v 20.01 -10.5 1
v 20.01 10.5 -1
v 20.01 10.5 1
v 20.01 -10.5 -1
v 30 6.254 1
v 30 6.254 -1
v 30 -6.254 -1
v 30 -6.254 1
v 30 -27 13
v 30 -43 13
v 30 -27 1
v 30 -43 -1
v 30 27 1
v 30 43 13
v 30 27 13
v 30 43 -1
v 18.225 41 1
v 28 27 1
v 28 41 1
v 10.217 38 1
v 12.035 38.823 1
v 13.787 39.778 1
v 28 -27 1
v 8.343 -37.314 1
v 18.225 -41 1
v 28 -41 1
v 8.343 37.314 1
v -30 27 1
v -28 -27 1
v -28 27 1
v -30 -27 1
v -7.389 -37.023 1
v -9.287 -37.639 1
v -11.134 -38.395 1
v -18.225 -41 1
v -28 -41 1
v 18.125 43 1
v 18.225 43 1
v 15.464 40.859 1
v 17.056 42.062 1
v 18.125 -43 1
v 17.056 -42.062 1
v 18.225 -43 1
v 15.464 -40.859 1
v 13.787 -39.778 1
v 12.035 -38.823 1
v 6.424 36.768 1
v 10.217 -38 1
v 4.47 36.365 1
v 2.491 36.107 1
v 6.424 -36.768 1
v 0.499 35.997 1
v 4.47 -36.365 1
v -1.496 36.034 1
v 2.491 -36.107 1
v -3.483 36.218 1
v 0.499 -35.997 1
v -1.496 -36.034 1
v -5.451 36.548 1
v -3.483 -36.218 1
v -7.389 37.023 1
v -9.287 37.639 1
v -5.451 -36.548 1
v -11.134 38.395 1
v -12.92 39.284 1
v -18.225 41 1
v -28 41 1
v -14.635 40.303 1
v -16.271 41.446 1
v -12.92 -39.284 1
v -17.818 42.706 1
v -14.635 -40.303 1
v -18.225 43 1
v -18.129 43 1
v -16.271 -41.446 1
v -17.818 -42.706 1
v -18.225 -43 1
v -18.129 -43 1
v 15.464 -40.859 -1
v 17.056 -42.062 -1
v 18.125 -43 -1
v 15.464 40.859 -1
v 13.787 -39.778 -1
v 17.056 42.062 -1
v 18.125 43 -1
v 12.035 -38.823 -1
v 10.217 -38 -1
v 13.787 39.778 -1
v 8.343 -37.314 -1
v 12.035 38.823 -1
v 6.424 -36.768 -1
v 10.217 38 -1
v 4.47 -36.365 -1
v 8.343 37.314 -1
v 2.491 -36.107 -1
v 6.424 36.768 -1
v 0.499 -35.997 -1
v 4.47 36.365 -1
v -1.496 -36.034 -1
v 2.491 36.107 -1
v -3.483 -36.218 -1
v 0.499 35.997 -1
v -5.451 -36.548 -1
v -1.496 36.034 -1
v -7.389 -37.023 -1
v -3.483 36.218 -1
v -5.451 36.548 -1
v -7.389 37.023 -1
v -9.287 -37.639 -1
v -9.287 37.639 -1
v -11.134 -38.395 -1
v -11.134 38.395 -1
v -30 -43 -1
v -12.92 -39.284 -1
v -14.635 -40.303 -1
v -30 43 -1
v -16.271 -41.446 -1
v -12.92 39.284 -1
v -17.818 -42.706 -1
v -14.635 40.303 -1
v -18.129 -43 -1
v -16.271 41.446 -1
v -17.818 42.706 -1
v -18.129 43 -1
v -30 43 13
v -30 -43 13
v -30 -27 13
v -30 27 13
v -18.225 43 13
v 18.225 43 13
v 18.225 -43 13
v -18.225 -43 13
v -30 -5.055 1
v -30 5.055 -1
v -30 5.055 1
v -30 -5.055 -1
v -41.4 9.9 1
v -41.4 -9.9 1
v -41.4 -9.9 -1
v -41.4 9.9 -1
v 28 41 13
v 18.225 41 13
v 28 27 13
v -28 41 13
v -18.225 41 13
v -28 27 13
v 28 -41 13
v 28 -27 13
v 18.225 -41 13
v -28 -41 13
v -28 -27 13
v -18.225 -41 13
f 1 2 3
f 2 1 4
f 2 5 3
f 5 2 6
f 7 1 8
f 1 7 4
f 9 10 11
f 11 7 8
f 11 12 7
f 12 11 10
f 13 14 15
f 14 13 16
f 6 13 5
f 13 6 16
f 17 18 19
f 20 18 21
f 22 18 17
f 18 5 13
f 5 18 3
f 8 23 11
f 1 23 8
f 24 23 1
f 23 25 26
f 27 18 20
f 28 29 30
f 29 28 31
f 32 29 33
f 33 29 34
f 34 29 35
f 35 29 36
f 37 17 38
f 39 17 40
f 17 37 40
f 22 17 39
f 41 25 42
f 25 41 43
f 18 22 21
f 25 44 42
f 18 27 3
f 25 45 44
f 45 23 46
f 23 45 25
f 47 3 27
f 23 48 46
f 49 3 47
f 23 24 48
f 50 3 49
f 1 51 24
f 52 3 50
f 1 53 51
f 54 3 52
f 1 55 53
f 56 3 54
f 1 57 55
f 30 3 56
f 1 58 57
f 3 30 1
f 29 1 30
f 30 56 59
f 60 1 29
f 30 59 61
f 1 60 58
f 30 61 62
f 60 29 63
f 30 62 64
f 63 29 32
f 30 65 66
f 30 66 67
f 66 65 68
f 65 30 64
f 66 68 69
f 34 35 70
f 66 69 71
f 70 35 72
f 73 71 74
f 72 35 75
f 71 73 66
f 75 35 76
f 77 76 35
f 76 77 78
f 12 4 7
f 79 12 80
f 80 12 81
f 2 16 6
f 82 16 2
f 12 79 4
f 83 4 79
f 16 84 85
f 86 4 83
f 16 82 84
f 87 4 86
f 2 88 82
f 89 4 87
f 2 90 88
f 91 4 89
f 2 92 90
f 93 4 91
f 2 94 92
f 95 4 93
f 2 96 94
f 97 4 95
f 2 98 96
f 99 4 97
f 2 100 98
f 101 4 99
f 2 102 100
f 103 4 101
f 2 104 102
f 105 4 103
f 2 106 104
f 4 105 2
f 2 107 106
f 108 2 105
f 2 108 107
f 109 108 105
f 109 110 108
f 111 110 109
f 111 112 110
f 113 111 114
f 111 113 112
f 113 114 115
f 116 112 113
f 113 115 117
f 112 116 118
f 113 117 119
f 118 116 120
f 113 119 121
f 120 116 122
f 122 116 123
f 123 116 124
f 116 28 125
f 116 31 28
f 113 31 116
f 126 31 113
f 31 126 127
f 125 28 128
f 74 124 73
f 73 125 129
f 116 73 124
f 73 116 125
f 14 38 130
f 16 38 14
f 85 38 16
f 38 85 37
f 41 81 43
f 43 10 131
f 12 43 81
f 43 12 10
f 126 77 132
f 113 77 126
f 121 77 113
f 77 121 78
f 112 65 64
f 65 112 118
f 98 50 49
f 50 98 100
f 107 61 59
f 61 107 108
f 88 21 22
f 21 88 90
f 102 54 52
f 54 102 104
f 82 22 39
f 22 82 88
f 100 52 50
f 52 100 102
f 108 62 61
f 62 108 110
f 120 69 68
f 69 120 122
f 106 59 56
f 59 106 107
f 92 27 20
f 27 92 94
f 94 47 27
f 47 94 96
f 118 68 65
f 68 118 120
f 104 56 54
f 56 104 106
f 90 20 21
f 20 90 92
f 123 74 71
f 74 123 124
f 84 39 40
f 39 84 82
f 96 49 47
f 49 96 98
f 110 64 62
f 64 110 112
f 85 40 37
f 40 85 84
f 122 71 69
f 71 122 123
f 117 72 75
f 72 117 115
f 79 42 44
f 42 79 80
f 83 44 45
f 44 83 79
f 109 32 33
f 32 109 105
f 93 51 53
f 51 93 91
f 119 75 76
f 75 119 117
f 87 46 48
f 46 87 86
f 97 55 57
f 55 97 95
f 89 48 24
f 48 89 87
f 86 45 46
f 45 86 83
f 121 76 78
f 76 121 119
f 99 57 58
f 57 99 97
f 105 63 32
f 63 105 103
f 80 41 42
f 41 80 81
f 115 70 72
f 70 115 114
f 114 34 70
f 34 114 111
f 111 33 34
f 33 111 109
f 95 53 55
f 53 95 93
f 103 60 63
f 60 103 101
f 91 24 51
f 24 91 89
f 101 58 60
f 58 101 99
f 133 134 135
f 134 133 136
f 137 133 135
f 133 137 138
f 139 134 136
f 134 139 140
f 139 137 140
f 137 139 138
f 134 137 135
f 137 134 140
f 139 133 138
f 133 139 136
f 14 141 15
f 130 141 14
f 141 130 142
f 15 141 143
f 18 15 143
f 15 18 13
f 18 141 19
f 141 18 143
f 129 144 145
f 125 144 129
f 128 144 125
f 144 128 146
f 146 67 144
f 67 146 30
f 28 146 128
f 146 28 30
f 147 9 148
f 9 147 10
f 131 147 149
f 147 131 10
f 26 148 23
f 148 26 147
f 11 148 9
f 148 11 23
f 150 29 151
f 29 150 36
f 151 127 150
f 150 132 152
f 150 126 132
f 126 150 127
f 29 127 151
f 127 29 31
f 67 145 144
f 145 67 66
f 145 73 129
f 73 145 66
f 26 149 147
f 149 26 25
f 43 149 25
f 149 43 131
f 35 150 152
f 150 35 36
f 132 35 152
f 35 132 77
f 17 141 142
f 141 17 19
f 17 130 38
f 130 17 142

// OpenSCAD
// [FL_INDEX: keywords="openscad, 3d_parametric, Game_card_holder, csg_solid" | COT="Parametric OpenSCAD design from 3DCodeverse"]
// Title: Game card holder

//Settlers game card holder
// 1 to 1 copy of previous blender version but with parameters for changeing dimention

//Constants
card_x = 54; //original 54
card_y = 80; //original 80
card_space = 2; //original 2
wall_thickness = 2; //original 2
plate_height = 2; //original 2
wall_height = 12; //original 12
shortwall_cut = card_x/(card_y/card_x);
shortwall = (card_x-shortwall_cut)/2+wall_thickness+card_space/2;

//Connecting piece
//the "female" part is 21mm at the biggest point and 12.5mm at the smallest and 10mm deep
//the "male" part is  19.8mm at the biggest point and 10.46mm at smallest and 11.4mm long
//the odd numbers are because i used a manualy freehand modifed box with no real grid snapping, and some random scaling
female_con_x = 10;
female_con_y1 = 21;
female_con_y2 = 12.5;
male_con_x = 11.4;
male_con_y1 = 19.8;
male_con_y2 = 10.46;
angle = atan( ((female_con_y1-female_con_y2)/2) / female_con_x ); // same for both


union() {

	difference() {
		//Base plate
		cube(size = [card_x+card_space+wall_thickness*2, card_y+card_space+wall_thickness*2,plate_height], center = true);
		//Round Cut
		// was made with a cylinder with radius=32 scaled in x and y by 0.8, resulting in R=25.6 and that is aprox card_x
		translate([0,card_y/1.27,-card_x/4])
		cylinder(card_x/2, card_x/2, card_x/2, $fa=2);
		translate([0,-card_y/1.27,-card_x/4])
		cylinder(card_x/2, card_x/2, card_x/2, $fa=2);
		
		//female con
		translate( [ (card_x/2) - female_con_x + card_space/2 + wall_thickness +0.01 , -female_con_y1/2, -plate_height ] ) //0.01 is for overlapping
		difference() {
			cube(size = [female_con_x, female_con_y1, plate_height*2], center = false);
			translate( [ 0,female_con_y1,-1 ] )
			rotate([0, 0, -angle])
			cube(female_con_x*2);
			translate( [ 0,0,-1 ] )
			rotate([0, 0, angle-90])
			cube(female_con_x*2);
		}

	}

	//male con
	translate( [ -(card_x/2) - card_space/2 - wall_thickness - male_con_x, -male_con_y1/2, -plate_height/2 ] ) 
	difference() {
		cube(size = [male_con_x, male_con_y1, plate_height], center = false);
		translate( [ 0,male_con_y1,-1 ] )
		rotate([0, 0, -angle])
		cube(male_con_x*2);
		translate( [ 0,0,-1 ] )
		rotate([0, 0, angle-90])
		cube(male_con_x*2);
	}

	//Cards for reference
	//%cube(size = [card_x,card_y,9], center = true);
	//%cube(size = [card_y,card_x,9], center = true);
	
	//%cube(size= [shortwall_cut, 100,20], center = true);
	
	// Long wall 1 of 4
	translate([  (card_x+card_space+wall_thickness*2)/2 , (card_y+card_space+wall_thickness*2)/2 ,plate_height/2])
	rotate([0,0,180])
	cube(size = [wall_thickness,(card_y-card_x)/2+wall_thickness+card_space/2,wall_height] ,center = false);
	
	// Long wall 2 of 4
	translate([  -(card_x+card_space+wall_thickness*2)/2 +wall_thickness , (card_y+card_space+wall_thickness*2)/2 ,plate_height/2])
	rotate([0,0,180])
	cube(size = [wall_thickness,(card_y-card_x)/2+wall_thickness+card_space/2,wall_height] ,center = false);
	
	// Long wall 3 of 4
	translate([  (card_x+card_space+wall_thickness*2)/2 -wall_thickness, -(card_y+card_space+wall_thickness*2)/2 ,plate_height/2])
	rotate([0,0,0])
	cube(size = [wall_thickness,(card_y-card_x)/2+wall_thickness+card_space/2,wall_height] ,center = false);
	
	// Long wall 4 of 4
	translate([  -(card_x+card_space+wall_thickness*2)/2 , -(card_y+card_space+wall_thickness*2)/2 ,plate_height/2])
	rotate([0,0,0])
	cube(size = [wall_thickness,(card_y-card_x)/2+wall_thickness+card_space/2,wall_height] ,center = false);
	
	//Shortwall 1 of 4
	//the cut to make the space between the walls was originaly 37mm
	translate([  -(card_x+card_space+wall_thickness*2)/2  , (card_y+card_space+wall_thickness*2)/2 ,plate_height/2])
	rotate([0,0,270])
	cube(size = [wall_thickness, shortwall , wall_height] ,center = false);
	
	//Shortwall 2 of 4
	//the cut to make the space between the walls was originaly 37mm
	translate([  (card_x+card_space+wall_thickness*2)/2 , -(card_y+card_space+wall_thickness*2)/2 ,plate_height/2])
	rotate([0,0,90])
	cube(size = [wall_thickness, shortwall , wall_height] ,center = false);
	
	//Shortwall 3 of 4
	//the cut to make the space between the walls was originaly 37mm
	translate([  -(card_x+card_space+wall_thickness*2)/2 , -(card_y+card_space+wall_thickness*2)/2 +wall_thickness ,plate_height/2])
	rotate([0,0,270])
	cube(size = [wall_thickness, shortwall , wall_height] ,center = false);
	
	//Shortwall 4 of 4
	//the cut to make the space between the walls was originaly 37mm
	translate([  (card_x+card_space+wall_thickness*2)/2 , (card_y+card_space+wall_thickness*2)/2 -wall_thickness ,plate_height/2])
	rotate([0,0,90])
	cube(size = [wall_thickness, shortwall , wall_height] ,center = false);
	

}
